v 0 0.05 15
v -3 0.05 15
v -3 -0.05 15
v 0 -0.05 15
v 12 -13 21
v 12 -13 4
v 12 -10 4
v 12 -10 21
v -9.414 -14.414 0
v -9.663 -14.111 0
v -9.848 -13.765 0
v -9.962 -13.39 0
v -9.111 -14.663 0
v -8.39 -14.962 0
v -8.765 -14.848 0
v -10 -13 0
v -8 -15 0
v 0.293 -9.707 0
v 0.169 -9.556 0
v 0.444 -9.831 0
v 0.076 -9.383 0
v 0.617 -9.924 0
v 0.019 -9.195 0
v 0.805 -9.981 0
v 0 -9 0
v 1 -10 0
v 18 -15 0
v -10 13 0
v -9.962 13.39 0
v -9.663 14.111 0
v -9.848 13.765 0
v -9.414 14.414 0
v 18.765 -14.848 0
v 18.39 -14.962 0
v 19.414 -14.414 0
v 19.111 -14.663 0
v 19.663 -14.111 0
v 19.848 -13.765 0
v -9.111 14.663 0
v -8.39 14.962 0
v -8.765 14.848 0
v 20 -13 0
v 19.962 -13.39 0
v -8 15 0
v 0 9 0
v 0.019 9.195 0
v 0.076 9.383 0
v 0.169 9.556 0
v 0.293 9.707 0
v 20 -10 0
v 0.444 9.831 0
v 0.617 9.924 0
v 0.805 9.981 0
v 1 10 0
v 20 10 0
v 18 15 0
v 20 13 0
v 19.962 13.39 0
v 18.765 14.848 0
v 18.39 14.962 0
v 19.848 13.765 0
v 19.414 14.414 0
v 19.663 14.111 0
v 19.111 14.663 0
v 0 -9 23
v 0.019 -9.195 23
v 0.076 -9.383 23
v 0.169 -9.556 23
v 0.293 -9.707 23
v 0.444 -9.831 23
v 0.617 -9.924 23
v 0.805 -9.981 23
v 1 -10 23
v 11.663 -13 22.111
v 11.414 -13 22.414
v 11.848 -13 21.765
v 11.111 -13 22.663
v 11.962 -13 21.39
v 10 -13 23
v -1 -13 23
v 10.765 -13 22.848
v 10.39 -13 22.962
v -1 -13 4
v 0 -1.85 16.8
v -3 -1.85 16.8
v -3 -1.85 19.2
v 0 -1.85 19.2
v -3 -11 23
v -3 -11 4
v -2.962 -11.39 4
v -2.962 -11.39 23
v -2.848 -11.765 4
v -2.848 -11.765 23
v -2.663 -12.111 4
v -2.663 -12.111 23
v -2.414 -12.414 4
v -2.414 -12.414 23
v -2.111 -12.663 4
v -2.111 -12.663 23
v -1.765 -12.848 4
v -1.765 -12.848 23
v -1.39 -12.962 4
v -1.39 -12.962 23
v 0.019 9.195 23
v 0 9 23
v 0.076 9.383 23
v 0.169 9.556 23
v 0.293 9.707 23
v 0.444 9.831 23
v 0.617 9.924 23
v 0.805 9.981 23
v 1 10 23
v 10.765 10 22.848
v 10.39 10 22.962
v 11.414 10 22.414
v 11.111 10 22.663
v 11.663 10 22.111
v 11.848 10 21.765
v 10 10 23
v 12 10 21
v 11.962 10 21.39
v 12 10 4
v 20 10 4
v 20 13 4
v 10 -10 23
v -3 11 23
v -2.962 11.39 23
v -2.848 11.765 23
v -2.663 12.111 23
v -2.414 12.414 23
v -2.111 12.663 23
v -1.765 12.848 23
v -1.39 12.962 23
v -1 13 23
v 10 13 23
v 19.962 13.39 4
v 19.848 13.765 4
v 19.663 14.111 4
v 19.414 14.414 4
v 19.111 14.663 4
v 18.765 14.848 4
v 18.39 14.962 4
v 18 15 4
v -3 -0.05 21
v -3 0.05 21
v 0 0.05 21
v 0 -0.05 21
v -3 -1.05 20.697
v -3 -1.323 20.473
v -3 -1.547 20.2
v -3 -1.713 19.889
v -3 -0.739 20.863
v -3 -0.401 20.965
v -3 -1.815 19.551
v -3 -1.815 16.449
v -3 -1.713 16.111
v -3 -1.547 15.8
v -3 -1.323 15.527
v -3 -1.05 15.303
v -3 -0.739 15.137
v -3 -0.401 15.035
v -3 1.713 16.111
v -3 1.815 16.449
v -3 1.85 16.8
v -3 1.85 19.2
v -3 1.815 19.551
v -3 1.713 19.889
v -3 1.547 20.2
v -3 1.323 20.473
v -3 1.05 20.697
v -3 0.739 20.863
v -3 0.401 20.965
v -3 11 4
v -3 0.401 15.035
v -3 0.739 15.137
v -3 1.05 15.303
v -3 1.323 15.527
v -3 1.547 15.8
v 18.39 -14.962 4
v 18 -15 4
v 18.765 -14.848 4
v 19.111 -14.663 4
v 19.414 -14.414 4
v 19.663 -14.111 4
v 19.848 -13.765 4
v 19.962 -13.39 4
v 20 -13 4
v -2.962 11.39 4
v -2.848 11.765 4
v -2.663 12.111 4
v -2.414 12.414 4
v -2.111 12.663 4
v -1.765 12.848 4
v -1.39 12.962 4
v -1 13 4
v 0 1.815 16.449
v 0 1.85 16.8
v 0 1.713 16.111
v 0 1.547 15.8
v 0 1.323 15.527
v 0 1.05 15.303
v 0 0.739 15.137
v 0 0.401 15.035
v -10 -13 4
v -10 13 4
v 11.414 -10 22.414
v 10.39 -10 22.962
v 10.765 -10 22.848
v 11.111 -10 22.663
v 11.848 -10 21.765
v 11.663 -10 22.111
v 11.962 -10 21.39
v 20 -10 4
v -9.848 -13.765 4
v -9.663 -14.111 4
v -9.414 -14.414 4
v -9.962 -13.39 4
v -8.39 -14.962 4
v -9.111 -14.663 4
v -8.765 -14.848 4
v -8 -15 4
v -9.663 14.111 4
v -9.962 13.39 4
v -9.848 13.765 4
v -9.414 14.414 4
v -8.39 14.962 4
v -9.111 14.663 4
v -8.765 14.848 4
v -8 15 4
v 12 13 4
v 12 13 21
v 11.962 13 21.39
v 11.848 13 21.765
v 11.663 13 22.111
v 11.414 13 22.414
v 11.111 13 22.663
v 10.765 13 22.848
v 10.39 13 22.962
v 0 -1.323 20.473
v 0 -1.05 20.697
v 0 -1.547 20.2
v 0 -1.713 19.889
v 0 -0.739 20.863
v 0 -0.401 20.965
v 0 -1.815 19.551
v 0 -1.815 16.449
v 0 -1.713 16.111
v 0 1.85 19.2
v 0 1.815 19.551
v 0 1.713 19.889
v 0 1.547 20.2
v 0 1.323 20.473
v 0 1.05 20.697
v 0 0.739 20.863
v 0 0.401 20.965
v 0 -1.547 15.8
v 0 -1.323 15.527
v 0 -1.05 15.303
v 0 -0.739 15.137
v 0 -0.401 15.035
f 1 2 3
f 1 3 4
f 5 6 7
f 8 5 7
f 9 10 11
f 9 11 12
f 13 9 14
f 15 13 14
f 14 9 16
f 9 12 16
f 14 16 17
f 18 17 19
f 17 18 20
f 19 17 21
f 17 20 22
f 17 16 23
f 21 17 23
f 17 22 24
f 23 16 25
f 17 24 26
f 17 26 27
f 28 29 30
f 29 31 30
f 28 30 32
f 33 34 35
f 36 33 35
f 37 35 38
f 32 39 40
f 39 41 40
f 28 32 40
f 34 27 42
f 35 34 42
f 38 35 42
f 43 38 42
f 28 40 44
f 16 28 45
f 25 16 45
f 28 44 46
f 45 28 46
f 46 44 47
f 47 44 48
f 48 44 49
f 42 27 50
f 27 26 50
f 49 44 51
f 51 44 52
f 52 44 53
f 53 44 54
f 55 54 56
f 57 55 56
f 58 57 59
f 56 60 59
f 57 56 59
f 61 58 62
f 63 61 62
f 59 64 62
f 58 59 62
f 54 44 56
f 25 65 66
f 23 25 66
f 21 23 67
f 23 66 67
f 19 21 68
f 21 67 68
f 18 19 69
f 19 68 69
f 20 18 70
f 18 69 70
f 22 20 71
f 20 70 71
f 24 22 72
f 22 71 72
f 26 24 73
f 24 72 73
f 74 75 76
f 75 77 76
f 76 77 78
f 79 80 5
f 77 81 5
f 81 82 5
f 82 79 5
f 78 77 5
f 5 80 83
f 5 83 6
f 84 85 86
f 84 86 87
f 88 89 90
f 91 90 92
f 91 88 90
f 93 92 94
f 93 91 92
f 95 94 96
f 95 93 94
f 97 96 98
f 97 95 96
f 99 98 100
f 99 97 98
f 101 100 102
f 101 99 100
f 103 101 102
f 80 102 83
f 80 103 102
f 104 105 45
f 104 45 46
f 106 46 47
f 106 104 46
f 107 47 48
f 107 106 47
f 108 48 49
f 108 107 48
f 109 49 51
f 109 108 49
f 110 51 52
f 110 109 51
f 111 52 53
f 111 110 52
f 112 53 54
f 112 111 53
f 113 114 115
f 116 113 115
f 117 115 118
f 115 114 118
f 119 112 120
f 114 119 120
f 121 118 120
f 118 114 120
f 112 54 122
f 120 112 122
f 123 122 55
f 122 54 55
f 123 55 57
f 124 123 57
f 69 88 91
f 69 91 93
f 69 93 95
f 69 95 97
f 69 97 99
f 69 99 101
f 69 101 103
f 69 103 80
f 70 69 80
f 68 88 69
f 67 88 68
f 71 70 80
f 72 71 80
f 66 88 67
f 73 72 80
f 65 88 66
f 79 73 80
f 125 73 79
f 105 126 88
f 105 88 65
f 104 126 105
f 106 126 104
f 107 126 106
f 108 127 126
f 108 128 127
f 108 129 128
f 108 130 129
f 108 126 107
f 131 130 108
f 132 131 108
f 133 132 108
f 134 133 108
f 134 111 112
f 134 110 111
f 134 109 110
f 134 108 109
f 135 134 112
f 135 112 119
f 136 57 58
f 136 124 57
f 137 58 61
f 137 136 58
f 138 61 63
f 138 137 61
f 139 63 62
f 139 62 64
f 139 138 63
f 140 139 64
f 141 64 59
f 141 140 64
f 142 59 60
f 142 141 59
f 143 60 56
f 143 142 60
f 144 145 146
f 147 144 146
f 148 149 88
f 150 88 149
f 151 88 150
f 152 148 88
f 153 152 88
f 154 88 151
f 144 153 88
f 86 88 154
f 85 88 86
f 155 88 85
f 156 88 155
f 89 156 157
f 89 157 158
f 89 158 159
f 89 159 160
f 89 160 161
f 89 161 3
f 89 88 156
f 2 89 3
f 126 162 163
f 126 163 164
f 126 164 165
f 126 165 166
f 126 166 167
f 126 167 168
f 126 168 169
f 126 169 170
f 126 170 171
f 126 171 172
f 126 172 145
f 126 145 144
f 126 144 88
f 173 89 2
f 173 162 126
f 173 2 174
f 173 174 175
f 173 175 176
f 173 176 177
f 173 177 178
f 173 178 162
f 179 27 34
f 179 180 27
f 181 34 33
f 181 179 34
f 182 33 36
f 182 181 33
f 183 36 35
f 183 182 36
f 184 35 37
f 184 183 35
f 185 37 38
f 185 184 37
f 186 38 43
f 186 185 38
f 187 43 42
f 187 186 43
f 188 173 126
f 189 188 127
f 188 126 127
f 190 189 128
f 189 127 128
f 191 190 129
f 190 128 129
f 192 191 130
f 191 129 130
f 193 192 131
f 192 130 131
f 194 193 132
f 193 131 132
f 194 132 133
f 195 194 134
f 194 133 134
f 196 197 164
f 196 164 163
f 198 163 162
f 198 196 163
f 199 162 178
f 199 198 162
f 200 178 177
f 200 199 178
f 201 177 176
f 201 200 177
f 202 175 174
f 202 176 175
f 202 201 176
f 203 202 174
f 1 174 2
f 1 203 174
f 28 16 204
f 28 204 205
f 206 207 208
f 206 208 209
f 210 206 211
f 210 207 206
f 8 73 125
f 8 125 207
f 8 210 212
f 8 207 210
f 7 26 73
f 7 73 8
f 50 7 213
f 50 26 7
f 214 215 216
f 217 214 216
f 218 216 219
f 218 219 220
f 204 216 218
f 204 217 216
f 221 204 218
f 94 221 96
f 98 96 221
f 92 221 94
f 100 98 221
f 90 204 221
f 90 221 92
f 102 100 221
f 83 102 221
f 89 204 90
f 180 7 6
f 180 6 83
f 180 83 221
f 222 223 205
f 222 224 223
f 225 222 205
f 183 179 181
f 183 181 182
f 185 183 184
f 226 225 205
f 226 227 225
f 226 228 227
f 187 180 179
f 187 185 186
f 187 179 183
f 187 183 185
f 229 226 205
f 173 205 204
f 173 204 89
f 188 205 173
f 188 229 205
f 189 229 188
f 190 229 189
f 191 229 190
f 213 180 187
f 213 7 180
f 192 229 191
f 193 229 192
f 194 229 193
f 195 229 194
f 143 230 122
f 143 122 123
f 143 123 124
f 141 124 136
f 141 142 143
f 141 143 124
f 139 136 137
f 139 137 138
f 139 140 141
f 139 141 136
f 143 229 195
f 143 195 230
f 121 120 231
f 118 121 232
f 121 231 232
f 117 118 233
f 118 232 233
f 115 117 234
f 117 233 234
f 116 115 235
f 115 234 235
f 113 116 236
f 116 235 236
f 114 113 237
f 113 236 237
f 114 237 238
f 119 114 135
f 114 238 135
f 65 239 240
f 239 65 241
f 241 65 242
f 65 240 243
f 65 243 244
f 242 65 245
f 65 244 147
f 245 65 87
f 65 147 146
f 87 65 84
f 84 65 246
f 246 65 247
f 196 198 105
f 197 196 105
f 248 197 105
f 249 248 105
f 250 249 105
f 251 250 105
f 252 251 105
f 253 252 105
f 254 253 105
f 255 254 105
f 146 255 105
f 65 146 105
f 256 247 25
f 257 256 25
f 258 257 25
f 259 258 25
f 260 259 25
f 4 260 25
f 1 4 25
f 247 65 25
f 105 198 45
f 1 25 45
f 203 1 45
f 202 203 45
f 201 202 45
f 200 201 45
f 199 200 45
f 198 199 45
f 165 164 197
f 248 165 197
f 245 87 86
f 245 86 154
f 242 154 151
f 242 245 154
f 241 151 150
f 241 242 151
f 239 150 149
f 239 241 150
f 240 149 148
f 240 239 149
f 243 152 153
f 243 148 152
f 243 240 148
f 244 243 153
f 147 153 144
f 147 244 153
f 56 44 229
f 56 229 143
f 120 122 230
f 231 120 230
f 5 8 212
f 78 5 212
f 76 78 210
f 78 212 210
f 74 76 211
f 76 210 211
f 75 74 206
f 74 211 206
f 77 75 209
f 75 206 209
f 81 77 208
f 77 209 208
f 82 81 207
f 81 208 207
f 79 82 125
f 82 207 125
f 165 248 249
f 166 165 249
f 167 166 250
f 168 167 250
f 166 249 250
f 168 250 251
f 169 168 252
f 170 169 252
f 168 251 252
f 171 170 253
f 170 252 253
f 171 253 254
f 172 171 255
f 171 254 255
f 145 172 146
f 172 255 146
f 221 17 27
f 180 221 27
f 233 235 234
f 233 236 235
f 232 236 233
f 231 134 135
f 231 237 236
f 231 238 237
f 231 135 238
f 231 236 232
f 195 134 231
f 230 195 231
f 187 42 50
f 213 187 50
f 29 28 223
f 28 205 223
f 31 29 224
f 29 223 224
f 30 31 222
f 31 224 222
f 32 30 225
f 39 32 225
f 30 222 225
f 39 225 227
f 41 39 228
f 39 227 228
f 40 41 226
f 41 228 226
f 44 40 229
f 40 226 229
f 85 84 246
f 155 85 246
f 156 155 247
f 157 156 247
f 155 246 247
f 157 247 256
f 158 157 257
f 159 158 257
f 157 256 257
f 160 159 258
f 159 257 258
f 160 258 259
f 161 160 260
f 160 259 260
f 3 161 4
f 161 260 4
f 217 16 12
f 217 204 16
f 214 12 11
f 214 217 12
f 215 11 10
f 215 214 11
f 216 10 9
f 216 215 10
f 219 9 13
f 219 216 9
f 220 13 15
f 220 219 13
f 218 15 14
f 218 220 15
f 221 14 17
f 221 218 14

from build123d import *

# Parameters (mm, degrees)
BOX003_W     = 50
BOX003_H     = 3.7
BOX003_DEPTH = 6
FILLET003_R  = 1.8
BOX_W        = 50
BOX_H        = 20
BOX_DEPTH    = 50
FILLET_R     = 1
BOX002_W     = 30
BOX002_H     = 30
BOX002_DEPTH = 4
FILLET002_R  = 2
BOX001_W     = 15
BOX001_H     = 26
BOX001_DEPTH = 23
FILLET001_R  = 2


with BuildPart() as fillet003:
    # Box003 → Box003 (new body)
    with BuildSketch(Plane(origin=(-20, -1.85, 15), x_dir=(1, 0, 0), z_dir=(0, 0, 1))):
        with Locations((25, 1.85)):
            Rectangle(BOX003_W, BOX003_H)
    extrude(amount=BOX003_DEPTH)

    # Fillet003
    fillet003_edges = [fillet003.edges().sort_by_distance(p)[0] for p in [
        (5, -1.85, 15),
        (5, -1.85, 21),
        (5, 1.85, 15),
        (5, 1.85, 21),
    ]]
    fillet(fillet003_edges, radius=FILLET003_R)


with BuildPart() as fusion001:
    # Box → Box (new body)
    with BuildSketch(Plane(origin=(0, -10, 0), x_dir=(1, 0, 0), z_dir=(0, 0, 1))):
        with Locations((25, 10)):
            Rectangle(BOX_W, BOX_H)
    extrude(amount=BOX_DEPTH)

    # Fillet
    fillet_edges = [fusion001.edges().sort_by_distance(p)[0] for p in [
        (0, -10, 25),
        (0, 10, 25),
    ]]
    fillet(fillet_edges, radius=FILLET_R)

    # Fusion001: union Fillet003
    add(fillet003.part)


with BuildPart() as fillet002:
    # Box002 → Box002 (new body)
    with BuildSketch(Plane(origin=(-10, -15, 0), x_dir=(1, 0, 0), z_dir=(0, 0, 1))):
        with Locations((15, 15)):
            Rectangle(BOX002_W, BOX002_H)
    extrude(amount=BOX002_DEPTH)

    # Fillet002
    fillet002_edges = [fillet002.edges().sort_by_distance(p)[0] for p in [
        (-10, -15, 2),
        (-10, 15, 2),
        (20, -15, 2),
        (20, 15, 2),
    ]]
    fillet(fillet002_edges, radius=FILLET002_R)


with BuildPart() as flood_sensor:
    # Box001 → Box001 (new body)
    with BuildSketch(Plane(origin=(-3, -13, 0), x_dir=(1, 0, 0), z_dir=(0, 0, 1))):
        with Locations((7.5, 13)):
            Rectangle(BOX001_W, BOX001_H)
    extrude(amount=BOX001_DEPTH)

    # Fillet001
    fillet001_edges = [flood_sensor.edges().sort_by_distance(p)[0] for p in [
        (-3, -13, 11.5),
        (-3, 13, 11.5),
        (12, 0, 23),
    ]]
    fillet(fillet001_edges, radius=FILLET001_R)

    # Fusion: union Fillet002
    add(fillet002.part)

    # Cut: cut Fusion001
    add(fusion001.part, mode=Mode.SUBTRACT)


solid = flood_sensor.part
